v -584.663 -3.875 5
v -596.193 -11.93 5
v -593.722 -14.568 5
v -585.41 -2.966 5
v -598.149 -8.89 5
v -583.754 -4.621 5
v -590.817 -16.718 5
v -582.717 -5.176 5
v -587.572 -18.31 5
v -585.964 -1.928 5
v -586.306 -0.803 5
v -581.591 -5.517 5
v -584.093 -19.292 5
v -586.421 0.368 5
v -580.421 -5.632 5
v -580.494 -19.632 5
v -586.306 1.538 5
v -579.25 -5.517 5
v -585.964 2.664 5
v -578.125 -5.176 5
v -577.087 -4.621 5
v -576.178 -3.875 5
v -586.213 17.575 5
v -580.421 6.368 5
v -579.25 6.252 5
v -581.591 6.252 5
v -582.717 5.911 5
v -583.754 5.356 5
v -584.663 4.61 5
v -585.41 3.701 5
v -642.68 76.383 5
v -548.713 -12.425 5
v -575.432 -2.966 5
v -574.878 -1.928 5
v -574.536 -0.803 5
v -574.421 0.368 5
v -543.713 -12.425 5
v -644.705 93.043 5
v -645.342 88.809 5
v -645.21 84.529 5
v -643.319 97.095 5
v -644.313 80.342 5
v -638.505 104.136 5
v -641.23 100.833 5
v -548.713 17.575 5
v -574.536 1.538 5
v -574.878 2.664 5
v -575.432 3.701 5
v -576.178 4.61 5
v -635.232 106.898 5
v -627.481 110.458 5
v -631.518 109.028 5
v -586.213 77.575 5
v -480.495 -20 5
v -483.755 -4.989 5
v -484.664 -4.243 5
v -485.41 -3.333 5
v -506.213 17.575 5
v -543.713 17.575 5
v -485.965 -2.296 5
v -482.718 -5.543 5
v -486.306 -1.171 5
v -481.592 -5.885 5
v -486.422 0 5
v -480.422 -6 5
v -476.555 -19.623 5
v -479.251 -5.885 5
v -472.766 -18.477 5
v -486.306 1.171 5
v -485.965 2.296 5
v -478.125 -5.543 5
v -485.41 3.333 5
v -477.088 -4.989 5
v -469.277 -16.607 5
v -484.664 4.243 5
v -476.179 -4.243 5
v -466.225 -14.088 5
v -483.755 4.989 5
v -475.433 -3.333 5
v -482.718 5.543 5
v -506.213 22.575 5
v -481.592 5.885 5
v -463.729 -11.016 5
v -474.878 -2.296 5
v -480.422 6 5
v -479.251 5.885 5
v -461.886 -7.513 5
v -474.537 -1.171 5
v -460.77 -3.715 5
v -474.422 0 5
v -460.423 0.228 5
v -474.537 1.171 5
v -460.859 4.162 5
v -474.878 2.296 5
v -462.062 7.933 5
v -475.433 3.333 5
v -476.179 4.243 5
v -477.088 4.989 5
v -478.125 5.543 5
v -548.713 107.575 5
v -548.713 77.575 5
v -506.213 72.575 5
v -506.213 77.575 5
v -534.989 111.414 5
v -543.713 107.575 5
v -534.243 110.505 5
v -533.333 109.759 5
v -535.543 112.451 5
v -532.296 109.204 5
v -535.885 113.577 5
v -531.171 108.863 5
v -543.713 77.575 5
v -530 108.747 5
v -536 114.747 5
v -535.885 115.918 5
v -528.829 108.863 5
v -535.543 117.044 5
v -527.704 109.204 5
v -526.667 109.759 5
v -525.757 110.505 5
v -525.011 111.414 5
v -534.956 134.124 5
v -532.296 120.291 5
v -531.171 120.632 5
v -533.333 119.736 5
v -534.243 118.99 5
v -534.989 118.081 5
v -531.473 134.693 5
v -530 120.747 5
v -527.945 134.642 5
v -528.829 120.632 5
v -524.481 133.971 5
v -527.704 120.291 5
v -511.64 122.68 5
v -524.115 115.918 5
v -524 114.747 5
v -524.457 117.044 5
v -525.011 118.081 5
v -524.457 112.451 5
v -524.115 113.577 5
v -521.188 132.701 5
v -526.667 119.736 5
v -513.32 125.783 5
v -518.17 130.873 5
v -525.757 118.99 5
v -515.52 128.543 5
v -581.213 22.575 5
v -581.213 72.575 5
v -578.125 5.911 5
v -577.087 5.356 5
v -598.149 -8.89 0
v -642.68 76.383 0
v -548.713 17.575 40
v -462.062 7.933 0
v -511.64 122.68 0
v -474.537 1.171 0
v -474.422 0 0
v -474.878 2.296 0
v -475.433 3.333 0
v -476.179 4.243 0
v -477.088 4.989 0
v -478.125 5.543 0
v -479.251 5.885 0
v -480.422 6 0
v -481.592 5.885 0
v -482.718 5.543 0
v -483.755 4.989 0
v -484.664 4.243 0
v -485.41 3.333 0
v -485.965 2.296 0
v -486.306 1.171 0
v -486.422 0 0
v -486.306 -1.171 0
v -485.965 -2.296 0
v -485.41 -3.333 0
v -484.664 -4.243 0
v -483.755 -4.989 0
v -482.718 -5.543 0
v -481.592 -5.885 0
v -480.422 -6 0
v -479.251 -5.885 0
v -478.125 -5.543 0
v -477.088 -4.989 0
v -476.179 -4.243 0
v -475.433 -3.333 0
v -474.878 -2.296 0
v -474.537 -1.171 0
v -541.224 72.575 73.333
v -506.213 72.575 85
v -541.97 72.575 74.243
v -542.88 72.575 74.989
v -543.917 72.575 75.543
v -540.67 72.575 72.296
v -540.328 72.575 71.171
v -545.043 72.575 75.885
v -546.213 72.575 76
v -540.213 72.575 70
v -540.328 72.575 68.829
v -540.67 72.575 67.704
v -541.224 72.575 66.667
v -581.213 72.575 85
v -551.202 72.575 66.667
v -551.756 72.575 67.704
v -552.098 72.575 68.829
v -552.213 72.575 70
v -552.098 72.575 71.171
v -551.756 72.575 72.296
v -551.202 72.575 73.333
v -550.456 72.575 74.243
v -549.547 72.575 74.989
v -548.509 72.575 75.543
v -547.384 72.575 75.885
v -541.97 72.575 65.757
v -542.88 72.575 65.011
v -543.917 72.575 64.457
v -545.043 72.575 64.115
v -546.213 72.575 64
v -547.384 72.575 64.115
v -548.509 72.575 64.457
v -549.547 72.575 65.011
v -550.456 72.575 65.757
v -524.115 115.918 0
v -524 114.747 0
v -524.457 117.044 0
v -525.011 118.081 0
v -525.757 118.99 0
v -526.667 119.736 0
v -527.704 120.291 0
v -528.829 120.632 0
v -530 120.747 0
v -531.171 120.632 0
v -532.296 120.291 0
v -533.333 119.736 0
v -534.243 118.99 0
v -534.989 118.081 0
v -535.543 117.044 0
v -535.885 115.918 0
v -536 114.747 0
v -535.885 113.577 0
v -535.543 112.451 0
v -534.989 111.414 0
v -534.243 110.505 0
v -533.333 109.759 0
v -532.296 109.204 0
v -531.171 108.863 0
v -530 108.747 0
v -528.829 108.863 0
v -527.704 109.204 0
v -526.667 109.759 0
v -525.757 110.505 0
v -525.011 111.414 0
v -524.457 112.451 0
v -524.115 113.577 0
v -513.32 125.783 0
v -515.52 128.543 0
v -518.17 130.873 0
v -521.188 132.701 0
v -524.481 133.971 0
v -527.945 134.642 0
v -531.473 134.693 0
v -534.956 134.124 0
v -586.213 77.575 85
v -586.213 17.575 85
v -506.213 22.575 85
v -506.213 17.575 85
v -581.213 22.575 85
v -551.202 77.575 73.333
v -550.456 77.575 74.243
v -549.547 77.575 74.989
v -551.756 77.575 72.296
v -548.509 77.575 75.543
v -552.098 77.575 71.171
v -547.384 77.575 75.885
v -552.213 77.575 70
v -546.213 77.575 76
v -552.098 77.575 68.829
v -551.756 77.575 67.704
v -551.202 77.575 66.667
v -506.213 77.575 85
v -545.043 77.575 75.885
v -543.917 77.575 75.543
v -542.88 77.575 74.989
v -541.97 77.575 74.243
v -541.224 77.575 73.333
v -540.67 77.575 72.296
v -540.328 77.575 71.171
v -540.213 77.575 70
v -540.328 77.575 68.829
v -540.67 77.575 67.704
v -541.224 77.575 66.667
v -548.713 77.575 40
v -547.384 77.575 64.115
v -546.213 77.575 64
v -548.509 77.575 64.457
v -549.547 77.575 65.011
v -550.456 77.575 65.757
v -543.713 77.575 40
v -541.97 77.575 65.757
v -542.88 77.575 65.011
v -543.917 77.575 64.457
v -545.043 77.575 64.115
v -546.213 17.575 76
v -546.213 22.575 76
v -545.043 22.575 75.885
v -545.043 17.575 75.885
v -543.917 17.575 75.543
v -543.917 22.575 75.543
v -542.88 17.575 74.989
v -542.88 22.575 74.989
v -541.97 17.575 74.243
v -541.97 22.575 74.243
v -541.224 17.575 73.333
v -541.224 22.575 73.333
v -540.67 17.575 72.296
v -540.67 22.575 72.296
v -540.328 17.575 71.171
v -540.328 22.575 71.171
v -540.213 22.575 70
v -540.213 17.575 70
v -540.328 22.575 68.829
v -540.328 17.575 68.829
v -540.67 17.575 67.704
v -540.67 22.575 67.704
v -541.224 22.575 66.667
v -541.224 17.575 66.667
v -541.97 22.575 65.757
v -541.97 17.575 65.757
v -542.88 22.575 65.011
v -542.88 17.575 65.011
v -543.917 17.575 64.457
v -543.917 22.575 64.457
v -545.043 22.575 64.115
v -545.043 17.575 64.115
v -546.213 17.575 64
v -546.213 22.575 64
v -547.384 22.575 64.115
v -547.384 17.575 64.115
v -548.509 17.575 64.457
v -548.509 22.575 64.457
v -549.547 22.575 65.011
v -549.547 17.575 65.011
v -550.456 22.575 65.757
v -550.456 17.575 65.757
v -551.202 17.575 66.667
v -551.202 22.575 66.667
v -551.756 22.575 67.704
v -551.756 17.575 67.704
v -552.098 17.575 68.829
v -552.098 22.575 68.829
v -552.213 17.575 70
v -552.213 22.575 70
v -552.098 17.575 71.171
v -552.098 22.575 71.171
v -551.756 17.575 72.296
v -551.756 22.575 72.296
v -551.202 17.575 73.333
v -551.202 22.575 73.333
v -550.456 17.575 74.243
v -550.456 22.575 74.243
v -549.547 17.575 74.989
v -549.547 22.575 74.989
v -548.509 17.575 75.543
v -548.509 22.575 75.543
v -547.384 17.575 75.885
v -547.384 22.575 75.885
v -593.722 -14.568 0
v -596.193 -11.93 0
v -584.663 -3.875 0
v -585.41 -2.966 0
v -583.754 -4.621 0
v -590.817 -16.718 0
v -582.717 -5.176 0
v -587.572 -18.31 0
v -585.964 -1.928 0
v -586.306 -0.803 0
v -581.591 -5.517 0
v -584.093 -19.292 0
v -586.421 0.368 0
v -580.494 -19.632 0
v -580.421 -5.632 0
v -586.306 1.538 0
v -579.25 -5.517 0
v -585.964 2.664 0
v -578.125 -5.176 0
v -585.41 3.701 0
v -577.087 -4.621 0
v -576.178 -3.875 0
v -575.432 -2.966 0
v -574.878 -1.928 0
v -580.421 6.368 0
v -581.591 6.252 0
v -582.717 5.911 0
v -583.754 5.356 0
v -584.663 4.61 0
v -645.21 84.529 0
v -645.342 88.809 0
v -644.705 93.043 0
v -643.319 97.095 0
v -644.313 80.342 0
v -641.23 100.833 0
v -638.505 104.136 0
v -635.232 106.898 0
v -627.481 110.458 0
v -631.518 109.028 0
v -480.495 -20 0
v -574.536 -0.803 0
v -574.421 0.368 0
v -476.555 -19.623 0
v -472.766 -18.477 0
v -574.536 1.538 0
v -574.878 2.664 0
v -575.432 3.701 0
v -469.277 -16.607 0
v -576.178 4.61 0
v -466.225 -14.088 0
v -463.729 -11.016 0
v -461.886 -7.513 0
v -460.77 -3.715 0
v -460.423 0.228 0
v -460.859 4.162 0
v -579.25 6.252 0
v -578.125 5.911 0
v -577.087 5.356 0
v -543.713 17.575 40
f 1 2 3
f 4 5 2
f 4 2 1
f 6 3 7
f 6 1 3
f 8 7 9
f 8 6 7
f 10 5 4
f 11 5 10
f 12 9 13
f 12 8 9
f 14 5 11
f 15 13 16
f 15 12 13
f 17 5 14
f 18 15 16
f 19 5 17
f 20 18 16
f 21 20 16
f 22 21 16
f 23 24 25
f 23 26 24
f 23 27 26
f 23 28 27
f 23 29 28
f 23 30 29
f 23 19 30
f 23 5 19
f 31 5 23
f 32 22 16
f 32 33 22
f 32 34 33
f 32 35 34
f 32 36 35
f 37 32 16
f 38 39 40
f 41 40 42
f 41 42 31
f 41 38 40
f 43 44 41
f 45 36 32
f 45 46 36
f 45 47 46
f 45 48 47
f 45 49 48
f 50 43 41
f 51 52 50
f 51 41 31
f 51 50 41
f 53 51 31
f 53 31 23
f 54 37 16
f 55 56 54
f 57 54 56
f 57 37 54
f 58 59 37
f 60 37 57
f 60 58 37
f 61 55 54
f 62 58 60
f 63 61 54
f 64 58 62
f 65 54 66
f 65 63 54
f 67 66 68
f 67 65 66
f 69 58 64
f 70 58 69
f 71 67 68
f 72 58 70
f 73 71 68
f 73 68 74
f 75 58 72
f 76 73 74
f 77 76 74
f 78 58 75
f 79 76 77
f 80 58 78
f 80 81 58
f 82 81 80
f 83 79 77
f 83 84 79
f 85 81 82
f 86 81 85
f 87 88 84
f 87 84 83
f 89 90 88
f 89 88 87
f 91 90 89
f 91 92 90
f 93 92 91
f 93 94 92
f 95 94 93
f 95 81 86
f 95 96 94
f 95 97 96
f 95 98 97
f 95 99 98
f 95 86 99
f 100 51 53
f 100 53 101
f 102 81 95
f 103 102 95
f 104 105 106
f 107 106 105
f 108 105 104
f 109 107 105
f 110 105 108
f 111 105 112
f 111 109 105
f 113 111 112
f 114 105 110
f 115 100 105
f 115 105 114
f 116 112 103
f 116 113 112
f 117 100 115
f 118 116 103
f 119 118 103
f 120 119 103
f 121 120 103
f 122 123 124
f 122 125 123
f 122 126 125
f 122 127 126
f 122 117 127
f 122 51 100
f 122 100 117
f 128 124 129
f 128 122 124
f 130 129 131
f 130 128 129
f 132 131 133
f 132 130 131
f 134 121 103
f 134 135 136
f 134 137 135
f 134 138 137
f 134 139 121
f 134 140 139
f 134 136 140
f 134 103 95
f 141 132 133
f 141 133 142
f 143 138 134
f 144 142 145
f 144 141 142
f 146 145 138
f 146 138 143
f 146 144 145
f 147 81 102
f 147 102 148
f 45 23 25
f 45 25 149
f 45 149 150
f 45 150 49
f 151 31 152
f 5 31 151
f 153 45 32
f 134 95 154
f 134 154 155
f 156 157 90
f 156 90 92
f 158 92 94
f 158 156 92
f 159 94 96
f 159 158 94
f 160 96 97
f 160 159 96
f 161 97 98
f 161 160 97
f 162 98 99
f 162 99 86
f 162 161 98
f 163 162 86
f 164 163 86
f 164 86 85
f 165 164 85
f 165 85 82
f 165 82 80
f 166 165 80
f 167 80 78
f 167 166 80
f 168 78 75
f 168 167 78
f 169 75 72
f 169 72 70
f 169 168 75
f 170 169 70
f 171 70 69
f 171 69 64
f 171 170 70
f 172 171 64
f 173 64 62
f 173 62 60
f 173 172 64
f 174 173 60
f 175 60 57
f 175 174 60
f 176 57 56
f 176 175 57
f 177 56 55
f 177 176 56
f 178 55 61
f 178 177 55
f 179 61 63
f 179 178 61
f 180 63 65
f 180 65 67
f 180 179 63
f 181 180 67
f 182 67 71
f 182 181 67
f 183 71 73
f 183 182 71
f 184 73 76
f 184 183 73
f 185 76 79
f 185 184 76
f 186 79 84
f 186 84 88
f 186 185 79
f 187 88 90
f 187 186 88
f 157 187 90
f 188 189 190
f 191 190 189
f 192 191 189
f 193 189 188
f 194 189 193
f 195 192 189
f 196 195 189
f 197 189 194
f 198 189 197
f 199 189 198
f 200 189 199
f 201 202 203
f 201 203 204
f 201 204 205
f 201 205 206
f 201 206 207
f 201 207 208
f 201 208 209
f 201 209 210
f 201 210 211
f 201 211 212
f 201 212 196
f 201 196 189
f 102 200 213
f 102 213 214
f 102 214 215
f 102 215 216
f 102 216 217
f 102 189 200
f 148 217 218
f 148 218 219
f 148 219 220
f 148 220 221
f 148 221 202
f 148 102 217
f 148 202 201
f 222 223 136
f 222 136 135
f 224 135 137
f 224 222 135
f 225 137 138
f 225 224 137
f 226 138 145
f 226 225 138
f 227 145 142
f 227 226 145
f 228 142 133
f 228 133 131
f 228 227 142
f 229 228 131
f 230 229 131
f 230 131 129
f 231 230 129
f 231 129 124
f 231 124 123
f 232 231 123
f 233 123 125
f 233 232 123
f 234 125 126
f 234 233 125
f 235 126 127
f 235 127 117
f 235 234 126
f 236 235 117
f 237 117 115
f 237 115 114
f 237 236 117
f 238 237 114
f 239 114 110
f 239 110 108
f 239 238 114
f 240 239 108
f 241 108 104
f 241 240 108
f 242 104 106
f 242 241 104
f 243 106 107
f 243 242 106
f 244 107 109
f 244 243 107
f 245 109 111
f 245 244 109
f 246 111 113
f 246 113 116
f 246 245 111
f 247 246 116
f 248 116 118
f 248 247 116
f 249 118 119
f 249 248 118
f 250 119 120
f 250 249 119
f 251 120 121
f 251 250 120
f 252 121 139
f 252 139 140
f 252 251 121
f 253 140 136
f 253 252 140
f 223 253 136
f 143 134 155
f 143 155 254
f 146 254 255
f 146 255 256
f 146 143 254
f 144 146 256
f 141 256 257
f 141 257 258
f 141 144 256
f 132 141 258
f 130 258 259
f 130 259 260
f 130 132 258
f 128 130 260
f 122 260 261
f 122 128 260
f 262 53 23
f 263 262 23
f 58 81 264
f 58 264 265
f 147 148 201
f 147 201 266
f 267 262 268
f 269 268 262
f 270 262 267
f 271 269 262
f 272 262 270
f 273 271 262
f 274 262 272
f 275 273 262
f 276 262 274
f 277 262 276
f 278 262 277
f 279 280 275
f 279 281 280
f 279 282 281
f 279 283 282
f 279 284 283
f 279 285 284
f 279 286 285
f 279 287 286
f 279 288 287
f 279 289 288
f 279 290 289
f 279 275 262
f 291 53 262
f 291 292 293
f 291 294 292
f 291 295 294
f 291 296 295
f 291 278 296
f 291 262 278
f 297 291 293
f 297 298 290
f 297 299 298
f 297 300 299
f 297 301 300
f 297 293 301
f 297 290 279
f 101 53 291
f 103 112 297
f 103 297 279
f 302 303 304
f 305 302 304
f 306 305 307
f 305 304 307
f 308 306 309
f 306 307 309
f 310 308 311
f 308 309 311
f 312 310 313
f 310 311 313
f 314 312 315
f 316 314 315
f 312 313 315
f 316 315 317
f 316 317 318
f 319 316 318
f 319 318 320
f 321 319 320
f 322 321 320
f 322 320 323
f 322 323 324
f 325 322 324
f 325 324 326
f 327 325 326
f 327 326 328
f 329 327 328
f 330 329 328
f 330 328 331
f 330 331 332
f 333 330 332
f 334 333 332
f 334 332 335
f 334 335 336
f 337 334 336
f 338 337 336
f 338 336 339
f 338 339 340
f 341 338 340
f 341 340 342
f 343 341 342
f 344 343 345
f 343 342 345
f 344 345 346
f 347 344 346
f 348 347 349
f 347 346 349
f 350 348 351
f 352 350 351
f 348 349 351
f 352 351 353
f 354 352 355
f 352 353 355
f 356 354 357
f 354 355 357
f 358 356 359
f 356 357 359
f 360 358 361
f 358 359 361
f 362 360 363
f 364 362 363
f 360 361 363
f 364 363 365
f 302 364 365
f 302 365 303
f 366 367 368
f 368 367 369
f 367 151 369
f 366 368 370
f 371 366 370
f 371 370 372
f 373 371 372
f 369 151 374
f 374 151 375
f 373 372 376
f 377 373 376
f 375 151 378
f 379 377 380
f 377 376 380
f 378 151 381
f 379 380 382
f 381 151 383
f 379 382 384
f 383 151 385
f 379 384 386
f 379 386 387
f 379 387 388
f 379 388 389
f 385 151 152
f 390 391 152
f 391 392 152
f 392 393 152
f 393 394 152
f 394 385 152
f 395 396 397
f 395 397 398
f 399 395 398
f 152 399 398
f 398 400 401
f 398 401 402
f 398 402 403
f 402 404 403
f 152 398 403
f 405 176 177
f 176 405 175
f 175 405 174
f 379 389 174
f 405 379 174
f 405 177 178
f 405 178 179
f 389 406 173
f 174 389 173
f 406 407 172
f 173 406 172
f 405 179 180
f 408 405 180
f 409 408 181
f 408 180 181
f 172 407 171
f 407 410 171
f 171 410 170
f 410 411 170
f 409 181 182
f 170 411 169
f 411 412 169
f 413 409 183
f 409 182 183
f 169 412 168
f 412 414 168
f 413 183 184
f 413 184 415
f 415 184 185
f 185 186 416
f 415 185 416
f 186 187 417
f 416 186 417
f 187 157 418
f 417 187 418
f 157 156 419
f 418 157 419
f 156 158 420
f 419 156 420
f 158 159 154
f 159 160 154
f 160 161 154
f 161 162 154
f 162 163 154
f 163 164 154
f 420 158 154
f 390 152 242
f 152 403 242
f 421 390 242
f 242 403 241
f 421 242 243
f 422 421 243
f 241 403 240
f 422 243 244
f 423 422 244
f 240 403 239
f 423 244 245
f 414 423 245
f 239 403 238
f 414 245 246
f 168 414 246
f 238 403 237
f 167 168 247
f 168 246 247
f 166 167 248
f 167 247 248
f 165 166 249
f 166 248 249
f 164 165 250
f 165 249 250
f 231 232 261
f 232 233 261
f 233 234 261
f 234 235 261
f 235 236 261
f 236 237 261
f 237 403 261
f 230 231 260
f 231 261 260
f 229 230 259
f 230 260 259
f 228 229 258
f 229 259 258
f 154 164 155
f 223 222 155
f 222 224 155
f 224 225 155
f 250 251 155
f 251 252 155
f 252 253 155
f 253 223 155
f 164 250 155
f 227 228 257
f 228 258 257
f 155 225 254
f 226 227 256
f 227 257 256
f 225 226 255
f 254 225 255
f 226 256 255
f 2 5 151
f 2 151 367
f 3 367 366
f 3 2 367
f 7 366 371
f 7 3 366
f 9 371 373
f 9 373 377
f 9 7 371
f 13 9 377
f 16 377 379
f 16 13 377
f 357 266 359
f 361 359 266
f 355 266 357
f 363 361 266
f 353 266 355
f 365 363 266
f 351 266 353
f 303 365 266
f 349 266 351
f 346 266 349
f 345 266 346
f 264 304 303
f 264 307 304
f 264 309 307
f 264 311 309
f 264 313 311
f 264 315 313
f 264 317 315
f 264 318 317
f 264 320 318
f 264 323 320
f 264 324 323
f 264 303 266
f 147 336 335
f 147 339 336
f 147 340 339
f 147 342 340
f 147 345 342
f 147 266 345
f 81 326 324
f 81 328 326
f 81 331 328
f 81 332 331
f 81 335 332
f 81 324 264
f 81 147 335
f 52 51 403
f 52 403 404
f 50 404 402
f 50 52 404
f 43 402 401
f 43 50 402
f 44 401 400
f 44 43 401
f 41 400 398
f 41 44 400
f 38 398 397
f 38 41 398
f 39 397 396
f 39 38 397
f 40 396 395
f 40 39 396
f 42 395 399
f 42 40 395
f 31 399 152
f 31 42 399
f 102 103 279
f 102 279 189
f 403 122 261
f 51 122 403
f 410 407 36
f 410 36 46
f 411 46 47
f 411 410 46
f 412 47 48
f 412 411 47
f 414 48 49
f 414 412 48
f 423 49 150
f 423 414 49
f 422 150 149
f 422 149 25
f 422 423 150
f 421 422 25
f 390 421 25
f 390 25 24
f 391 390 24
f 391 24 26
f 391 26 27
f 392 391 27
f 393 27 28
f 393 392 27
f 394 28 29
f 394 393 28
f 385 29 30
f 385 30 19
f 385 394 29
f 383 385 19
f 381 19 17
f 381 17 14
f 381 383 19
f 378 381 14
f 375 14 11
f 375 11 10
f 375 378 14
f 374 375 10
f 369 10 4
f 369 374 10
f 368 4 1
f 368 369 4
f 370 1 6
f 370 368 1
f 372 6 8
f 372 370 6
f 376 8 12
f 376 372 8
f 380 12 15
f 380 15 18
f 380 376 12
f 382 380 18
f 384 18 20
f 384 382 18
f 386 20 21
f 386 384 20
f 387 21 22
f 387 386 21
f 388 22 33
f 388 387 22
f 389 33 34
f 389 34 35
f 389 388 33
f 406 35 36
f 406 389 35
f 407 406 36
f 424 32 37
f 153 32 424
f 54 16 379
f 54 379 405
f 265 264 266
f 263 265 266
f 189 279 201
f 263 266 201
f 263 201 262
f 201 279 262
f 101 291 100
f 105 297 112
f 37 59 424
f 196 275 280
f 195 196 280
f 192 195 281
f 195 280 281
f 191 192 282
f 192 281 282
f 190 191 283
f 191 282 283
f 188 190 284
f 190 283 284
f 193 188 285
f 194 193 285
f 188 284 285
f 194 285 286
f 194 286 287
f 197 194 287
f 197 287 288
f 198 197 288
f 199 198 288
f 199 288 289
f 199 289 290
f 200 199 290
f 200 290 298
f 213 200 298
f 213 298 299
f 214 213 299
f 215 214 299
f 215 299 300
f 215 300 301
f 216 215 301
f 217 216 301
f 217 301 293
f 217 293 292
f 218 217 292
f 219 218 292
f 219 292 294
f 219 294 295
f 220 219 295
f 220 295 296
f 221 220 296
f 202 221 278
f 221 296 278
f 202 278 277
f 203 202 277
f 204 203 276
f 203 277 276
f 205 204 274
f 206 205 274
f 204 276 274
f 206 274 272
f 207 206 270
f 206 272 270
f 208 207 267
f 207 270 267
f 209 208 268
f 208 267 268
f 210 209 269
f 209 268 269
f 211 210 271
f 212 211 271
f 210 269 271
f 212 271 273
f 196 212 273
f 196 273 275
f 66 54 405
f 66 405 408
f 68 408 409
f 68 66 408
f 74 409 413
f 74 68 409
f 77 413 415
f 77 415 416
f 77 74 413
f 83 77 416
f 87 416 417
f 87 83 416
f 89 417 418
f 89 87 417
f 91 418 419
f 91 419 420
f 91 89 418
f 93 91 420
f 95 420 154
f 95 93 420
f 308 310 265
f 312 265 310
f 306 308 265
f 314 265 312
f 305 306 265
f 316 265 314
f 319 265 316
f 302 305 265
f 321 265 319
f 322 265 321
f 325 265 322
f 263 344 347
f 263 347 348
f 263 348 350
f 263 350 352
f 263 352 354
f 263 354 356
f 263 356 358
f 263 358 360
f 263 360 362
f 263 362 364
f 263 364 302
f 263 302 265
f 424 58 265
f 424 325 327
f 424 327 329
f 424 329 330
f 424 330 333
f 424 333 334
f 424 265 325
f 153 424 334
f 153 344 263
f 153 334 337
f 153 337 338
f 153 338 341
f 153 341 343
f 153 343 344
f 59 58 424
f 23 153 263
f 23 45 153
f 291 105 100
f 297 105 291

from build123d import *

# Parameters (mm, degrees)
ESQUISSE1_W             = 272.524799983
ESQUISSE1_H             = 173.408070163
ESQUISSE1_R             = 6
BOSS_EXTRU_1_DEPTH      = 5
ESQUISSE2_OUTSIDE_W     = 339.137
ESQUISSE2_OUTSIDE_H     = 240.02
ENL_V_MAT_EXTRU_1_DEPTH = 5
BOSS_EXTRU_2_DEPTH      = 80
ESQUISSE4_R             = 6
ENL_V_MAT_EXTRU_2_DEPTH = 98.574759668
BOSS_EXTRU_3_DEPTH      = 2.5


with BuildPart() as part:
    # Esquisse1 → Boss.-Extru.1 (new body)
    with BuildSketch(Plane.XY):
        with Locations((-544.151755804, 61.14332382)):
            Rectangle(ESQUISSE1_W, ESQUISSE1_H)
        with Locations((-580.420844254, 0.36763792)):
            Circle(ESQUISSE1_R, mode=Mode.SUBTRACT)
        with Locations((-480.421520044, 0)):
            Circle(ESQUISSE1_R, mode=Mode.SUBTRACT)
        with Locations((-530, 114.747437119)):
            Circle(ESQUISSE1_R, mode=Mode.SUBTRACT)
    extrude(amount=BOSS_EXTRU_1_DEPTH)

    # Esquisse2 outside → Enlèv. mat.-Extru.1 (cut)
    with BuildSketch(Plane.XY.offset(5)):
        with Locations((-544.1515, 61.143)):
            Rectangle(ESQUISSE2_OUTSIDE_W, ESQUISSE2_OUTSIDE_H)
        with BuildLine():
            Line((-534.956009313, 134.12365893), (-627.481332722, 110.457726071))
            ThreePointArc((-627.481332722, 110.457726071), (-643.319491193, 97.095160735), (-642.680296555, 76.382921688))
            Line((-642.680296555, 76.382921688), (-598.149058477, -8.890354328))
            ThreePointArc((-598.149058477, -8.890354328), (-590.816634727, -16.718249252), (-580.494371838, -19.632226922))
            Line((-580.494371838, -19.632226922), (-480.495047628, -19.999864842))
            ThreePointArc((-480.495047628, -19.999864842), (-463.728705311, -11.015894711), (-462.061930105, 7.932556793))
            Line((-462.061930105, 7.932556793), (-511.640410061, 122.679993912))
            ThreePointArc((-511.640410061, 122.679993912), (-521.187885573, 132.701451693), (-534.956009313, 134.12365893))
        make_face(mode=Mode.SUBTRACT)
    extrude(amount=-ENL_V_MAT_EXTRU_1_DEPTH, mode=Mode.SUBTRACT)

    # Esquisse3 → Boss.-Extru.2 (add)
    with BuildSketch(Plane.XY.offset(5)):
        Polygon((-586.213116183, 77.574759668), (-506.213116183, 77.574759668), (-506.213116183, 72.574759668), (-581.213116183, 72.574759668), (-581.213116183, 22.574759668), (-506.213116183, 22.574759668), (-506.213116183, 17.574759668), (-586.213116183, 17.574759668), (-586.213116183, 22.574759668), (-586.213116183, 72.574759668), align=None)
    extrude(amount=BOSS_EXTRU_2_DEPTH)

    # Esquisse4 → Enlèv. mat.-Extru.2 (cut, through all)
    with BuildSketch(Plane(origin=(0, 77.574759668, 0), x_dir=(1, 0, 0), z_dir=(0, 1, 0))):
        with Locations(Location((-546.213116183, -70, 0), (0, 0, 270))):  # turned: the seam where the file's is
            Circle(ESQUISSE4_R)
    extrude(amount=-ENL_V_MAT_EXTRU_2_DEPTH, mode=Mode.SUBTRACT)

    # Esquisse5 → Boss.-Extru.3 (add, symmetric)
    with BuildSketch(Plane.ZY.offset(546.213116183)):
        Polygon((5, 107.574759668), (40, 77.574759668), (5, 77.574759668), align=None)
        Polygon((5, 17.574759668), (5, -12.425240332), (40, 17.574759668), align=None)
    extrude(amount=BOSS_EXTRU_3_DEPTH, both=True)


solid = part.part
